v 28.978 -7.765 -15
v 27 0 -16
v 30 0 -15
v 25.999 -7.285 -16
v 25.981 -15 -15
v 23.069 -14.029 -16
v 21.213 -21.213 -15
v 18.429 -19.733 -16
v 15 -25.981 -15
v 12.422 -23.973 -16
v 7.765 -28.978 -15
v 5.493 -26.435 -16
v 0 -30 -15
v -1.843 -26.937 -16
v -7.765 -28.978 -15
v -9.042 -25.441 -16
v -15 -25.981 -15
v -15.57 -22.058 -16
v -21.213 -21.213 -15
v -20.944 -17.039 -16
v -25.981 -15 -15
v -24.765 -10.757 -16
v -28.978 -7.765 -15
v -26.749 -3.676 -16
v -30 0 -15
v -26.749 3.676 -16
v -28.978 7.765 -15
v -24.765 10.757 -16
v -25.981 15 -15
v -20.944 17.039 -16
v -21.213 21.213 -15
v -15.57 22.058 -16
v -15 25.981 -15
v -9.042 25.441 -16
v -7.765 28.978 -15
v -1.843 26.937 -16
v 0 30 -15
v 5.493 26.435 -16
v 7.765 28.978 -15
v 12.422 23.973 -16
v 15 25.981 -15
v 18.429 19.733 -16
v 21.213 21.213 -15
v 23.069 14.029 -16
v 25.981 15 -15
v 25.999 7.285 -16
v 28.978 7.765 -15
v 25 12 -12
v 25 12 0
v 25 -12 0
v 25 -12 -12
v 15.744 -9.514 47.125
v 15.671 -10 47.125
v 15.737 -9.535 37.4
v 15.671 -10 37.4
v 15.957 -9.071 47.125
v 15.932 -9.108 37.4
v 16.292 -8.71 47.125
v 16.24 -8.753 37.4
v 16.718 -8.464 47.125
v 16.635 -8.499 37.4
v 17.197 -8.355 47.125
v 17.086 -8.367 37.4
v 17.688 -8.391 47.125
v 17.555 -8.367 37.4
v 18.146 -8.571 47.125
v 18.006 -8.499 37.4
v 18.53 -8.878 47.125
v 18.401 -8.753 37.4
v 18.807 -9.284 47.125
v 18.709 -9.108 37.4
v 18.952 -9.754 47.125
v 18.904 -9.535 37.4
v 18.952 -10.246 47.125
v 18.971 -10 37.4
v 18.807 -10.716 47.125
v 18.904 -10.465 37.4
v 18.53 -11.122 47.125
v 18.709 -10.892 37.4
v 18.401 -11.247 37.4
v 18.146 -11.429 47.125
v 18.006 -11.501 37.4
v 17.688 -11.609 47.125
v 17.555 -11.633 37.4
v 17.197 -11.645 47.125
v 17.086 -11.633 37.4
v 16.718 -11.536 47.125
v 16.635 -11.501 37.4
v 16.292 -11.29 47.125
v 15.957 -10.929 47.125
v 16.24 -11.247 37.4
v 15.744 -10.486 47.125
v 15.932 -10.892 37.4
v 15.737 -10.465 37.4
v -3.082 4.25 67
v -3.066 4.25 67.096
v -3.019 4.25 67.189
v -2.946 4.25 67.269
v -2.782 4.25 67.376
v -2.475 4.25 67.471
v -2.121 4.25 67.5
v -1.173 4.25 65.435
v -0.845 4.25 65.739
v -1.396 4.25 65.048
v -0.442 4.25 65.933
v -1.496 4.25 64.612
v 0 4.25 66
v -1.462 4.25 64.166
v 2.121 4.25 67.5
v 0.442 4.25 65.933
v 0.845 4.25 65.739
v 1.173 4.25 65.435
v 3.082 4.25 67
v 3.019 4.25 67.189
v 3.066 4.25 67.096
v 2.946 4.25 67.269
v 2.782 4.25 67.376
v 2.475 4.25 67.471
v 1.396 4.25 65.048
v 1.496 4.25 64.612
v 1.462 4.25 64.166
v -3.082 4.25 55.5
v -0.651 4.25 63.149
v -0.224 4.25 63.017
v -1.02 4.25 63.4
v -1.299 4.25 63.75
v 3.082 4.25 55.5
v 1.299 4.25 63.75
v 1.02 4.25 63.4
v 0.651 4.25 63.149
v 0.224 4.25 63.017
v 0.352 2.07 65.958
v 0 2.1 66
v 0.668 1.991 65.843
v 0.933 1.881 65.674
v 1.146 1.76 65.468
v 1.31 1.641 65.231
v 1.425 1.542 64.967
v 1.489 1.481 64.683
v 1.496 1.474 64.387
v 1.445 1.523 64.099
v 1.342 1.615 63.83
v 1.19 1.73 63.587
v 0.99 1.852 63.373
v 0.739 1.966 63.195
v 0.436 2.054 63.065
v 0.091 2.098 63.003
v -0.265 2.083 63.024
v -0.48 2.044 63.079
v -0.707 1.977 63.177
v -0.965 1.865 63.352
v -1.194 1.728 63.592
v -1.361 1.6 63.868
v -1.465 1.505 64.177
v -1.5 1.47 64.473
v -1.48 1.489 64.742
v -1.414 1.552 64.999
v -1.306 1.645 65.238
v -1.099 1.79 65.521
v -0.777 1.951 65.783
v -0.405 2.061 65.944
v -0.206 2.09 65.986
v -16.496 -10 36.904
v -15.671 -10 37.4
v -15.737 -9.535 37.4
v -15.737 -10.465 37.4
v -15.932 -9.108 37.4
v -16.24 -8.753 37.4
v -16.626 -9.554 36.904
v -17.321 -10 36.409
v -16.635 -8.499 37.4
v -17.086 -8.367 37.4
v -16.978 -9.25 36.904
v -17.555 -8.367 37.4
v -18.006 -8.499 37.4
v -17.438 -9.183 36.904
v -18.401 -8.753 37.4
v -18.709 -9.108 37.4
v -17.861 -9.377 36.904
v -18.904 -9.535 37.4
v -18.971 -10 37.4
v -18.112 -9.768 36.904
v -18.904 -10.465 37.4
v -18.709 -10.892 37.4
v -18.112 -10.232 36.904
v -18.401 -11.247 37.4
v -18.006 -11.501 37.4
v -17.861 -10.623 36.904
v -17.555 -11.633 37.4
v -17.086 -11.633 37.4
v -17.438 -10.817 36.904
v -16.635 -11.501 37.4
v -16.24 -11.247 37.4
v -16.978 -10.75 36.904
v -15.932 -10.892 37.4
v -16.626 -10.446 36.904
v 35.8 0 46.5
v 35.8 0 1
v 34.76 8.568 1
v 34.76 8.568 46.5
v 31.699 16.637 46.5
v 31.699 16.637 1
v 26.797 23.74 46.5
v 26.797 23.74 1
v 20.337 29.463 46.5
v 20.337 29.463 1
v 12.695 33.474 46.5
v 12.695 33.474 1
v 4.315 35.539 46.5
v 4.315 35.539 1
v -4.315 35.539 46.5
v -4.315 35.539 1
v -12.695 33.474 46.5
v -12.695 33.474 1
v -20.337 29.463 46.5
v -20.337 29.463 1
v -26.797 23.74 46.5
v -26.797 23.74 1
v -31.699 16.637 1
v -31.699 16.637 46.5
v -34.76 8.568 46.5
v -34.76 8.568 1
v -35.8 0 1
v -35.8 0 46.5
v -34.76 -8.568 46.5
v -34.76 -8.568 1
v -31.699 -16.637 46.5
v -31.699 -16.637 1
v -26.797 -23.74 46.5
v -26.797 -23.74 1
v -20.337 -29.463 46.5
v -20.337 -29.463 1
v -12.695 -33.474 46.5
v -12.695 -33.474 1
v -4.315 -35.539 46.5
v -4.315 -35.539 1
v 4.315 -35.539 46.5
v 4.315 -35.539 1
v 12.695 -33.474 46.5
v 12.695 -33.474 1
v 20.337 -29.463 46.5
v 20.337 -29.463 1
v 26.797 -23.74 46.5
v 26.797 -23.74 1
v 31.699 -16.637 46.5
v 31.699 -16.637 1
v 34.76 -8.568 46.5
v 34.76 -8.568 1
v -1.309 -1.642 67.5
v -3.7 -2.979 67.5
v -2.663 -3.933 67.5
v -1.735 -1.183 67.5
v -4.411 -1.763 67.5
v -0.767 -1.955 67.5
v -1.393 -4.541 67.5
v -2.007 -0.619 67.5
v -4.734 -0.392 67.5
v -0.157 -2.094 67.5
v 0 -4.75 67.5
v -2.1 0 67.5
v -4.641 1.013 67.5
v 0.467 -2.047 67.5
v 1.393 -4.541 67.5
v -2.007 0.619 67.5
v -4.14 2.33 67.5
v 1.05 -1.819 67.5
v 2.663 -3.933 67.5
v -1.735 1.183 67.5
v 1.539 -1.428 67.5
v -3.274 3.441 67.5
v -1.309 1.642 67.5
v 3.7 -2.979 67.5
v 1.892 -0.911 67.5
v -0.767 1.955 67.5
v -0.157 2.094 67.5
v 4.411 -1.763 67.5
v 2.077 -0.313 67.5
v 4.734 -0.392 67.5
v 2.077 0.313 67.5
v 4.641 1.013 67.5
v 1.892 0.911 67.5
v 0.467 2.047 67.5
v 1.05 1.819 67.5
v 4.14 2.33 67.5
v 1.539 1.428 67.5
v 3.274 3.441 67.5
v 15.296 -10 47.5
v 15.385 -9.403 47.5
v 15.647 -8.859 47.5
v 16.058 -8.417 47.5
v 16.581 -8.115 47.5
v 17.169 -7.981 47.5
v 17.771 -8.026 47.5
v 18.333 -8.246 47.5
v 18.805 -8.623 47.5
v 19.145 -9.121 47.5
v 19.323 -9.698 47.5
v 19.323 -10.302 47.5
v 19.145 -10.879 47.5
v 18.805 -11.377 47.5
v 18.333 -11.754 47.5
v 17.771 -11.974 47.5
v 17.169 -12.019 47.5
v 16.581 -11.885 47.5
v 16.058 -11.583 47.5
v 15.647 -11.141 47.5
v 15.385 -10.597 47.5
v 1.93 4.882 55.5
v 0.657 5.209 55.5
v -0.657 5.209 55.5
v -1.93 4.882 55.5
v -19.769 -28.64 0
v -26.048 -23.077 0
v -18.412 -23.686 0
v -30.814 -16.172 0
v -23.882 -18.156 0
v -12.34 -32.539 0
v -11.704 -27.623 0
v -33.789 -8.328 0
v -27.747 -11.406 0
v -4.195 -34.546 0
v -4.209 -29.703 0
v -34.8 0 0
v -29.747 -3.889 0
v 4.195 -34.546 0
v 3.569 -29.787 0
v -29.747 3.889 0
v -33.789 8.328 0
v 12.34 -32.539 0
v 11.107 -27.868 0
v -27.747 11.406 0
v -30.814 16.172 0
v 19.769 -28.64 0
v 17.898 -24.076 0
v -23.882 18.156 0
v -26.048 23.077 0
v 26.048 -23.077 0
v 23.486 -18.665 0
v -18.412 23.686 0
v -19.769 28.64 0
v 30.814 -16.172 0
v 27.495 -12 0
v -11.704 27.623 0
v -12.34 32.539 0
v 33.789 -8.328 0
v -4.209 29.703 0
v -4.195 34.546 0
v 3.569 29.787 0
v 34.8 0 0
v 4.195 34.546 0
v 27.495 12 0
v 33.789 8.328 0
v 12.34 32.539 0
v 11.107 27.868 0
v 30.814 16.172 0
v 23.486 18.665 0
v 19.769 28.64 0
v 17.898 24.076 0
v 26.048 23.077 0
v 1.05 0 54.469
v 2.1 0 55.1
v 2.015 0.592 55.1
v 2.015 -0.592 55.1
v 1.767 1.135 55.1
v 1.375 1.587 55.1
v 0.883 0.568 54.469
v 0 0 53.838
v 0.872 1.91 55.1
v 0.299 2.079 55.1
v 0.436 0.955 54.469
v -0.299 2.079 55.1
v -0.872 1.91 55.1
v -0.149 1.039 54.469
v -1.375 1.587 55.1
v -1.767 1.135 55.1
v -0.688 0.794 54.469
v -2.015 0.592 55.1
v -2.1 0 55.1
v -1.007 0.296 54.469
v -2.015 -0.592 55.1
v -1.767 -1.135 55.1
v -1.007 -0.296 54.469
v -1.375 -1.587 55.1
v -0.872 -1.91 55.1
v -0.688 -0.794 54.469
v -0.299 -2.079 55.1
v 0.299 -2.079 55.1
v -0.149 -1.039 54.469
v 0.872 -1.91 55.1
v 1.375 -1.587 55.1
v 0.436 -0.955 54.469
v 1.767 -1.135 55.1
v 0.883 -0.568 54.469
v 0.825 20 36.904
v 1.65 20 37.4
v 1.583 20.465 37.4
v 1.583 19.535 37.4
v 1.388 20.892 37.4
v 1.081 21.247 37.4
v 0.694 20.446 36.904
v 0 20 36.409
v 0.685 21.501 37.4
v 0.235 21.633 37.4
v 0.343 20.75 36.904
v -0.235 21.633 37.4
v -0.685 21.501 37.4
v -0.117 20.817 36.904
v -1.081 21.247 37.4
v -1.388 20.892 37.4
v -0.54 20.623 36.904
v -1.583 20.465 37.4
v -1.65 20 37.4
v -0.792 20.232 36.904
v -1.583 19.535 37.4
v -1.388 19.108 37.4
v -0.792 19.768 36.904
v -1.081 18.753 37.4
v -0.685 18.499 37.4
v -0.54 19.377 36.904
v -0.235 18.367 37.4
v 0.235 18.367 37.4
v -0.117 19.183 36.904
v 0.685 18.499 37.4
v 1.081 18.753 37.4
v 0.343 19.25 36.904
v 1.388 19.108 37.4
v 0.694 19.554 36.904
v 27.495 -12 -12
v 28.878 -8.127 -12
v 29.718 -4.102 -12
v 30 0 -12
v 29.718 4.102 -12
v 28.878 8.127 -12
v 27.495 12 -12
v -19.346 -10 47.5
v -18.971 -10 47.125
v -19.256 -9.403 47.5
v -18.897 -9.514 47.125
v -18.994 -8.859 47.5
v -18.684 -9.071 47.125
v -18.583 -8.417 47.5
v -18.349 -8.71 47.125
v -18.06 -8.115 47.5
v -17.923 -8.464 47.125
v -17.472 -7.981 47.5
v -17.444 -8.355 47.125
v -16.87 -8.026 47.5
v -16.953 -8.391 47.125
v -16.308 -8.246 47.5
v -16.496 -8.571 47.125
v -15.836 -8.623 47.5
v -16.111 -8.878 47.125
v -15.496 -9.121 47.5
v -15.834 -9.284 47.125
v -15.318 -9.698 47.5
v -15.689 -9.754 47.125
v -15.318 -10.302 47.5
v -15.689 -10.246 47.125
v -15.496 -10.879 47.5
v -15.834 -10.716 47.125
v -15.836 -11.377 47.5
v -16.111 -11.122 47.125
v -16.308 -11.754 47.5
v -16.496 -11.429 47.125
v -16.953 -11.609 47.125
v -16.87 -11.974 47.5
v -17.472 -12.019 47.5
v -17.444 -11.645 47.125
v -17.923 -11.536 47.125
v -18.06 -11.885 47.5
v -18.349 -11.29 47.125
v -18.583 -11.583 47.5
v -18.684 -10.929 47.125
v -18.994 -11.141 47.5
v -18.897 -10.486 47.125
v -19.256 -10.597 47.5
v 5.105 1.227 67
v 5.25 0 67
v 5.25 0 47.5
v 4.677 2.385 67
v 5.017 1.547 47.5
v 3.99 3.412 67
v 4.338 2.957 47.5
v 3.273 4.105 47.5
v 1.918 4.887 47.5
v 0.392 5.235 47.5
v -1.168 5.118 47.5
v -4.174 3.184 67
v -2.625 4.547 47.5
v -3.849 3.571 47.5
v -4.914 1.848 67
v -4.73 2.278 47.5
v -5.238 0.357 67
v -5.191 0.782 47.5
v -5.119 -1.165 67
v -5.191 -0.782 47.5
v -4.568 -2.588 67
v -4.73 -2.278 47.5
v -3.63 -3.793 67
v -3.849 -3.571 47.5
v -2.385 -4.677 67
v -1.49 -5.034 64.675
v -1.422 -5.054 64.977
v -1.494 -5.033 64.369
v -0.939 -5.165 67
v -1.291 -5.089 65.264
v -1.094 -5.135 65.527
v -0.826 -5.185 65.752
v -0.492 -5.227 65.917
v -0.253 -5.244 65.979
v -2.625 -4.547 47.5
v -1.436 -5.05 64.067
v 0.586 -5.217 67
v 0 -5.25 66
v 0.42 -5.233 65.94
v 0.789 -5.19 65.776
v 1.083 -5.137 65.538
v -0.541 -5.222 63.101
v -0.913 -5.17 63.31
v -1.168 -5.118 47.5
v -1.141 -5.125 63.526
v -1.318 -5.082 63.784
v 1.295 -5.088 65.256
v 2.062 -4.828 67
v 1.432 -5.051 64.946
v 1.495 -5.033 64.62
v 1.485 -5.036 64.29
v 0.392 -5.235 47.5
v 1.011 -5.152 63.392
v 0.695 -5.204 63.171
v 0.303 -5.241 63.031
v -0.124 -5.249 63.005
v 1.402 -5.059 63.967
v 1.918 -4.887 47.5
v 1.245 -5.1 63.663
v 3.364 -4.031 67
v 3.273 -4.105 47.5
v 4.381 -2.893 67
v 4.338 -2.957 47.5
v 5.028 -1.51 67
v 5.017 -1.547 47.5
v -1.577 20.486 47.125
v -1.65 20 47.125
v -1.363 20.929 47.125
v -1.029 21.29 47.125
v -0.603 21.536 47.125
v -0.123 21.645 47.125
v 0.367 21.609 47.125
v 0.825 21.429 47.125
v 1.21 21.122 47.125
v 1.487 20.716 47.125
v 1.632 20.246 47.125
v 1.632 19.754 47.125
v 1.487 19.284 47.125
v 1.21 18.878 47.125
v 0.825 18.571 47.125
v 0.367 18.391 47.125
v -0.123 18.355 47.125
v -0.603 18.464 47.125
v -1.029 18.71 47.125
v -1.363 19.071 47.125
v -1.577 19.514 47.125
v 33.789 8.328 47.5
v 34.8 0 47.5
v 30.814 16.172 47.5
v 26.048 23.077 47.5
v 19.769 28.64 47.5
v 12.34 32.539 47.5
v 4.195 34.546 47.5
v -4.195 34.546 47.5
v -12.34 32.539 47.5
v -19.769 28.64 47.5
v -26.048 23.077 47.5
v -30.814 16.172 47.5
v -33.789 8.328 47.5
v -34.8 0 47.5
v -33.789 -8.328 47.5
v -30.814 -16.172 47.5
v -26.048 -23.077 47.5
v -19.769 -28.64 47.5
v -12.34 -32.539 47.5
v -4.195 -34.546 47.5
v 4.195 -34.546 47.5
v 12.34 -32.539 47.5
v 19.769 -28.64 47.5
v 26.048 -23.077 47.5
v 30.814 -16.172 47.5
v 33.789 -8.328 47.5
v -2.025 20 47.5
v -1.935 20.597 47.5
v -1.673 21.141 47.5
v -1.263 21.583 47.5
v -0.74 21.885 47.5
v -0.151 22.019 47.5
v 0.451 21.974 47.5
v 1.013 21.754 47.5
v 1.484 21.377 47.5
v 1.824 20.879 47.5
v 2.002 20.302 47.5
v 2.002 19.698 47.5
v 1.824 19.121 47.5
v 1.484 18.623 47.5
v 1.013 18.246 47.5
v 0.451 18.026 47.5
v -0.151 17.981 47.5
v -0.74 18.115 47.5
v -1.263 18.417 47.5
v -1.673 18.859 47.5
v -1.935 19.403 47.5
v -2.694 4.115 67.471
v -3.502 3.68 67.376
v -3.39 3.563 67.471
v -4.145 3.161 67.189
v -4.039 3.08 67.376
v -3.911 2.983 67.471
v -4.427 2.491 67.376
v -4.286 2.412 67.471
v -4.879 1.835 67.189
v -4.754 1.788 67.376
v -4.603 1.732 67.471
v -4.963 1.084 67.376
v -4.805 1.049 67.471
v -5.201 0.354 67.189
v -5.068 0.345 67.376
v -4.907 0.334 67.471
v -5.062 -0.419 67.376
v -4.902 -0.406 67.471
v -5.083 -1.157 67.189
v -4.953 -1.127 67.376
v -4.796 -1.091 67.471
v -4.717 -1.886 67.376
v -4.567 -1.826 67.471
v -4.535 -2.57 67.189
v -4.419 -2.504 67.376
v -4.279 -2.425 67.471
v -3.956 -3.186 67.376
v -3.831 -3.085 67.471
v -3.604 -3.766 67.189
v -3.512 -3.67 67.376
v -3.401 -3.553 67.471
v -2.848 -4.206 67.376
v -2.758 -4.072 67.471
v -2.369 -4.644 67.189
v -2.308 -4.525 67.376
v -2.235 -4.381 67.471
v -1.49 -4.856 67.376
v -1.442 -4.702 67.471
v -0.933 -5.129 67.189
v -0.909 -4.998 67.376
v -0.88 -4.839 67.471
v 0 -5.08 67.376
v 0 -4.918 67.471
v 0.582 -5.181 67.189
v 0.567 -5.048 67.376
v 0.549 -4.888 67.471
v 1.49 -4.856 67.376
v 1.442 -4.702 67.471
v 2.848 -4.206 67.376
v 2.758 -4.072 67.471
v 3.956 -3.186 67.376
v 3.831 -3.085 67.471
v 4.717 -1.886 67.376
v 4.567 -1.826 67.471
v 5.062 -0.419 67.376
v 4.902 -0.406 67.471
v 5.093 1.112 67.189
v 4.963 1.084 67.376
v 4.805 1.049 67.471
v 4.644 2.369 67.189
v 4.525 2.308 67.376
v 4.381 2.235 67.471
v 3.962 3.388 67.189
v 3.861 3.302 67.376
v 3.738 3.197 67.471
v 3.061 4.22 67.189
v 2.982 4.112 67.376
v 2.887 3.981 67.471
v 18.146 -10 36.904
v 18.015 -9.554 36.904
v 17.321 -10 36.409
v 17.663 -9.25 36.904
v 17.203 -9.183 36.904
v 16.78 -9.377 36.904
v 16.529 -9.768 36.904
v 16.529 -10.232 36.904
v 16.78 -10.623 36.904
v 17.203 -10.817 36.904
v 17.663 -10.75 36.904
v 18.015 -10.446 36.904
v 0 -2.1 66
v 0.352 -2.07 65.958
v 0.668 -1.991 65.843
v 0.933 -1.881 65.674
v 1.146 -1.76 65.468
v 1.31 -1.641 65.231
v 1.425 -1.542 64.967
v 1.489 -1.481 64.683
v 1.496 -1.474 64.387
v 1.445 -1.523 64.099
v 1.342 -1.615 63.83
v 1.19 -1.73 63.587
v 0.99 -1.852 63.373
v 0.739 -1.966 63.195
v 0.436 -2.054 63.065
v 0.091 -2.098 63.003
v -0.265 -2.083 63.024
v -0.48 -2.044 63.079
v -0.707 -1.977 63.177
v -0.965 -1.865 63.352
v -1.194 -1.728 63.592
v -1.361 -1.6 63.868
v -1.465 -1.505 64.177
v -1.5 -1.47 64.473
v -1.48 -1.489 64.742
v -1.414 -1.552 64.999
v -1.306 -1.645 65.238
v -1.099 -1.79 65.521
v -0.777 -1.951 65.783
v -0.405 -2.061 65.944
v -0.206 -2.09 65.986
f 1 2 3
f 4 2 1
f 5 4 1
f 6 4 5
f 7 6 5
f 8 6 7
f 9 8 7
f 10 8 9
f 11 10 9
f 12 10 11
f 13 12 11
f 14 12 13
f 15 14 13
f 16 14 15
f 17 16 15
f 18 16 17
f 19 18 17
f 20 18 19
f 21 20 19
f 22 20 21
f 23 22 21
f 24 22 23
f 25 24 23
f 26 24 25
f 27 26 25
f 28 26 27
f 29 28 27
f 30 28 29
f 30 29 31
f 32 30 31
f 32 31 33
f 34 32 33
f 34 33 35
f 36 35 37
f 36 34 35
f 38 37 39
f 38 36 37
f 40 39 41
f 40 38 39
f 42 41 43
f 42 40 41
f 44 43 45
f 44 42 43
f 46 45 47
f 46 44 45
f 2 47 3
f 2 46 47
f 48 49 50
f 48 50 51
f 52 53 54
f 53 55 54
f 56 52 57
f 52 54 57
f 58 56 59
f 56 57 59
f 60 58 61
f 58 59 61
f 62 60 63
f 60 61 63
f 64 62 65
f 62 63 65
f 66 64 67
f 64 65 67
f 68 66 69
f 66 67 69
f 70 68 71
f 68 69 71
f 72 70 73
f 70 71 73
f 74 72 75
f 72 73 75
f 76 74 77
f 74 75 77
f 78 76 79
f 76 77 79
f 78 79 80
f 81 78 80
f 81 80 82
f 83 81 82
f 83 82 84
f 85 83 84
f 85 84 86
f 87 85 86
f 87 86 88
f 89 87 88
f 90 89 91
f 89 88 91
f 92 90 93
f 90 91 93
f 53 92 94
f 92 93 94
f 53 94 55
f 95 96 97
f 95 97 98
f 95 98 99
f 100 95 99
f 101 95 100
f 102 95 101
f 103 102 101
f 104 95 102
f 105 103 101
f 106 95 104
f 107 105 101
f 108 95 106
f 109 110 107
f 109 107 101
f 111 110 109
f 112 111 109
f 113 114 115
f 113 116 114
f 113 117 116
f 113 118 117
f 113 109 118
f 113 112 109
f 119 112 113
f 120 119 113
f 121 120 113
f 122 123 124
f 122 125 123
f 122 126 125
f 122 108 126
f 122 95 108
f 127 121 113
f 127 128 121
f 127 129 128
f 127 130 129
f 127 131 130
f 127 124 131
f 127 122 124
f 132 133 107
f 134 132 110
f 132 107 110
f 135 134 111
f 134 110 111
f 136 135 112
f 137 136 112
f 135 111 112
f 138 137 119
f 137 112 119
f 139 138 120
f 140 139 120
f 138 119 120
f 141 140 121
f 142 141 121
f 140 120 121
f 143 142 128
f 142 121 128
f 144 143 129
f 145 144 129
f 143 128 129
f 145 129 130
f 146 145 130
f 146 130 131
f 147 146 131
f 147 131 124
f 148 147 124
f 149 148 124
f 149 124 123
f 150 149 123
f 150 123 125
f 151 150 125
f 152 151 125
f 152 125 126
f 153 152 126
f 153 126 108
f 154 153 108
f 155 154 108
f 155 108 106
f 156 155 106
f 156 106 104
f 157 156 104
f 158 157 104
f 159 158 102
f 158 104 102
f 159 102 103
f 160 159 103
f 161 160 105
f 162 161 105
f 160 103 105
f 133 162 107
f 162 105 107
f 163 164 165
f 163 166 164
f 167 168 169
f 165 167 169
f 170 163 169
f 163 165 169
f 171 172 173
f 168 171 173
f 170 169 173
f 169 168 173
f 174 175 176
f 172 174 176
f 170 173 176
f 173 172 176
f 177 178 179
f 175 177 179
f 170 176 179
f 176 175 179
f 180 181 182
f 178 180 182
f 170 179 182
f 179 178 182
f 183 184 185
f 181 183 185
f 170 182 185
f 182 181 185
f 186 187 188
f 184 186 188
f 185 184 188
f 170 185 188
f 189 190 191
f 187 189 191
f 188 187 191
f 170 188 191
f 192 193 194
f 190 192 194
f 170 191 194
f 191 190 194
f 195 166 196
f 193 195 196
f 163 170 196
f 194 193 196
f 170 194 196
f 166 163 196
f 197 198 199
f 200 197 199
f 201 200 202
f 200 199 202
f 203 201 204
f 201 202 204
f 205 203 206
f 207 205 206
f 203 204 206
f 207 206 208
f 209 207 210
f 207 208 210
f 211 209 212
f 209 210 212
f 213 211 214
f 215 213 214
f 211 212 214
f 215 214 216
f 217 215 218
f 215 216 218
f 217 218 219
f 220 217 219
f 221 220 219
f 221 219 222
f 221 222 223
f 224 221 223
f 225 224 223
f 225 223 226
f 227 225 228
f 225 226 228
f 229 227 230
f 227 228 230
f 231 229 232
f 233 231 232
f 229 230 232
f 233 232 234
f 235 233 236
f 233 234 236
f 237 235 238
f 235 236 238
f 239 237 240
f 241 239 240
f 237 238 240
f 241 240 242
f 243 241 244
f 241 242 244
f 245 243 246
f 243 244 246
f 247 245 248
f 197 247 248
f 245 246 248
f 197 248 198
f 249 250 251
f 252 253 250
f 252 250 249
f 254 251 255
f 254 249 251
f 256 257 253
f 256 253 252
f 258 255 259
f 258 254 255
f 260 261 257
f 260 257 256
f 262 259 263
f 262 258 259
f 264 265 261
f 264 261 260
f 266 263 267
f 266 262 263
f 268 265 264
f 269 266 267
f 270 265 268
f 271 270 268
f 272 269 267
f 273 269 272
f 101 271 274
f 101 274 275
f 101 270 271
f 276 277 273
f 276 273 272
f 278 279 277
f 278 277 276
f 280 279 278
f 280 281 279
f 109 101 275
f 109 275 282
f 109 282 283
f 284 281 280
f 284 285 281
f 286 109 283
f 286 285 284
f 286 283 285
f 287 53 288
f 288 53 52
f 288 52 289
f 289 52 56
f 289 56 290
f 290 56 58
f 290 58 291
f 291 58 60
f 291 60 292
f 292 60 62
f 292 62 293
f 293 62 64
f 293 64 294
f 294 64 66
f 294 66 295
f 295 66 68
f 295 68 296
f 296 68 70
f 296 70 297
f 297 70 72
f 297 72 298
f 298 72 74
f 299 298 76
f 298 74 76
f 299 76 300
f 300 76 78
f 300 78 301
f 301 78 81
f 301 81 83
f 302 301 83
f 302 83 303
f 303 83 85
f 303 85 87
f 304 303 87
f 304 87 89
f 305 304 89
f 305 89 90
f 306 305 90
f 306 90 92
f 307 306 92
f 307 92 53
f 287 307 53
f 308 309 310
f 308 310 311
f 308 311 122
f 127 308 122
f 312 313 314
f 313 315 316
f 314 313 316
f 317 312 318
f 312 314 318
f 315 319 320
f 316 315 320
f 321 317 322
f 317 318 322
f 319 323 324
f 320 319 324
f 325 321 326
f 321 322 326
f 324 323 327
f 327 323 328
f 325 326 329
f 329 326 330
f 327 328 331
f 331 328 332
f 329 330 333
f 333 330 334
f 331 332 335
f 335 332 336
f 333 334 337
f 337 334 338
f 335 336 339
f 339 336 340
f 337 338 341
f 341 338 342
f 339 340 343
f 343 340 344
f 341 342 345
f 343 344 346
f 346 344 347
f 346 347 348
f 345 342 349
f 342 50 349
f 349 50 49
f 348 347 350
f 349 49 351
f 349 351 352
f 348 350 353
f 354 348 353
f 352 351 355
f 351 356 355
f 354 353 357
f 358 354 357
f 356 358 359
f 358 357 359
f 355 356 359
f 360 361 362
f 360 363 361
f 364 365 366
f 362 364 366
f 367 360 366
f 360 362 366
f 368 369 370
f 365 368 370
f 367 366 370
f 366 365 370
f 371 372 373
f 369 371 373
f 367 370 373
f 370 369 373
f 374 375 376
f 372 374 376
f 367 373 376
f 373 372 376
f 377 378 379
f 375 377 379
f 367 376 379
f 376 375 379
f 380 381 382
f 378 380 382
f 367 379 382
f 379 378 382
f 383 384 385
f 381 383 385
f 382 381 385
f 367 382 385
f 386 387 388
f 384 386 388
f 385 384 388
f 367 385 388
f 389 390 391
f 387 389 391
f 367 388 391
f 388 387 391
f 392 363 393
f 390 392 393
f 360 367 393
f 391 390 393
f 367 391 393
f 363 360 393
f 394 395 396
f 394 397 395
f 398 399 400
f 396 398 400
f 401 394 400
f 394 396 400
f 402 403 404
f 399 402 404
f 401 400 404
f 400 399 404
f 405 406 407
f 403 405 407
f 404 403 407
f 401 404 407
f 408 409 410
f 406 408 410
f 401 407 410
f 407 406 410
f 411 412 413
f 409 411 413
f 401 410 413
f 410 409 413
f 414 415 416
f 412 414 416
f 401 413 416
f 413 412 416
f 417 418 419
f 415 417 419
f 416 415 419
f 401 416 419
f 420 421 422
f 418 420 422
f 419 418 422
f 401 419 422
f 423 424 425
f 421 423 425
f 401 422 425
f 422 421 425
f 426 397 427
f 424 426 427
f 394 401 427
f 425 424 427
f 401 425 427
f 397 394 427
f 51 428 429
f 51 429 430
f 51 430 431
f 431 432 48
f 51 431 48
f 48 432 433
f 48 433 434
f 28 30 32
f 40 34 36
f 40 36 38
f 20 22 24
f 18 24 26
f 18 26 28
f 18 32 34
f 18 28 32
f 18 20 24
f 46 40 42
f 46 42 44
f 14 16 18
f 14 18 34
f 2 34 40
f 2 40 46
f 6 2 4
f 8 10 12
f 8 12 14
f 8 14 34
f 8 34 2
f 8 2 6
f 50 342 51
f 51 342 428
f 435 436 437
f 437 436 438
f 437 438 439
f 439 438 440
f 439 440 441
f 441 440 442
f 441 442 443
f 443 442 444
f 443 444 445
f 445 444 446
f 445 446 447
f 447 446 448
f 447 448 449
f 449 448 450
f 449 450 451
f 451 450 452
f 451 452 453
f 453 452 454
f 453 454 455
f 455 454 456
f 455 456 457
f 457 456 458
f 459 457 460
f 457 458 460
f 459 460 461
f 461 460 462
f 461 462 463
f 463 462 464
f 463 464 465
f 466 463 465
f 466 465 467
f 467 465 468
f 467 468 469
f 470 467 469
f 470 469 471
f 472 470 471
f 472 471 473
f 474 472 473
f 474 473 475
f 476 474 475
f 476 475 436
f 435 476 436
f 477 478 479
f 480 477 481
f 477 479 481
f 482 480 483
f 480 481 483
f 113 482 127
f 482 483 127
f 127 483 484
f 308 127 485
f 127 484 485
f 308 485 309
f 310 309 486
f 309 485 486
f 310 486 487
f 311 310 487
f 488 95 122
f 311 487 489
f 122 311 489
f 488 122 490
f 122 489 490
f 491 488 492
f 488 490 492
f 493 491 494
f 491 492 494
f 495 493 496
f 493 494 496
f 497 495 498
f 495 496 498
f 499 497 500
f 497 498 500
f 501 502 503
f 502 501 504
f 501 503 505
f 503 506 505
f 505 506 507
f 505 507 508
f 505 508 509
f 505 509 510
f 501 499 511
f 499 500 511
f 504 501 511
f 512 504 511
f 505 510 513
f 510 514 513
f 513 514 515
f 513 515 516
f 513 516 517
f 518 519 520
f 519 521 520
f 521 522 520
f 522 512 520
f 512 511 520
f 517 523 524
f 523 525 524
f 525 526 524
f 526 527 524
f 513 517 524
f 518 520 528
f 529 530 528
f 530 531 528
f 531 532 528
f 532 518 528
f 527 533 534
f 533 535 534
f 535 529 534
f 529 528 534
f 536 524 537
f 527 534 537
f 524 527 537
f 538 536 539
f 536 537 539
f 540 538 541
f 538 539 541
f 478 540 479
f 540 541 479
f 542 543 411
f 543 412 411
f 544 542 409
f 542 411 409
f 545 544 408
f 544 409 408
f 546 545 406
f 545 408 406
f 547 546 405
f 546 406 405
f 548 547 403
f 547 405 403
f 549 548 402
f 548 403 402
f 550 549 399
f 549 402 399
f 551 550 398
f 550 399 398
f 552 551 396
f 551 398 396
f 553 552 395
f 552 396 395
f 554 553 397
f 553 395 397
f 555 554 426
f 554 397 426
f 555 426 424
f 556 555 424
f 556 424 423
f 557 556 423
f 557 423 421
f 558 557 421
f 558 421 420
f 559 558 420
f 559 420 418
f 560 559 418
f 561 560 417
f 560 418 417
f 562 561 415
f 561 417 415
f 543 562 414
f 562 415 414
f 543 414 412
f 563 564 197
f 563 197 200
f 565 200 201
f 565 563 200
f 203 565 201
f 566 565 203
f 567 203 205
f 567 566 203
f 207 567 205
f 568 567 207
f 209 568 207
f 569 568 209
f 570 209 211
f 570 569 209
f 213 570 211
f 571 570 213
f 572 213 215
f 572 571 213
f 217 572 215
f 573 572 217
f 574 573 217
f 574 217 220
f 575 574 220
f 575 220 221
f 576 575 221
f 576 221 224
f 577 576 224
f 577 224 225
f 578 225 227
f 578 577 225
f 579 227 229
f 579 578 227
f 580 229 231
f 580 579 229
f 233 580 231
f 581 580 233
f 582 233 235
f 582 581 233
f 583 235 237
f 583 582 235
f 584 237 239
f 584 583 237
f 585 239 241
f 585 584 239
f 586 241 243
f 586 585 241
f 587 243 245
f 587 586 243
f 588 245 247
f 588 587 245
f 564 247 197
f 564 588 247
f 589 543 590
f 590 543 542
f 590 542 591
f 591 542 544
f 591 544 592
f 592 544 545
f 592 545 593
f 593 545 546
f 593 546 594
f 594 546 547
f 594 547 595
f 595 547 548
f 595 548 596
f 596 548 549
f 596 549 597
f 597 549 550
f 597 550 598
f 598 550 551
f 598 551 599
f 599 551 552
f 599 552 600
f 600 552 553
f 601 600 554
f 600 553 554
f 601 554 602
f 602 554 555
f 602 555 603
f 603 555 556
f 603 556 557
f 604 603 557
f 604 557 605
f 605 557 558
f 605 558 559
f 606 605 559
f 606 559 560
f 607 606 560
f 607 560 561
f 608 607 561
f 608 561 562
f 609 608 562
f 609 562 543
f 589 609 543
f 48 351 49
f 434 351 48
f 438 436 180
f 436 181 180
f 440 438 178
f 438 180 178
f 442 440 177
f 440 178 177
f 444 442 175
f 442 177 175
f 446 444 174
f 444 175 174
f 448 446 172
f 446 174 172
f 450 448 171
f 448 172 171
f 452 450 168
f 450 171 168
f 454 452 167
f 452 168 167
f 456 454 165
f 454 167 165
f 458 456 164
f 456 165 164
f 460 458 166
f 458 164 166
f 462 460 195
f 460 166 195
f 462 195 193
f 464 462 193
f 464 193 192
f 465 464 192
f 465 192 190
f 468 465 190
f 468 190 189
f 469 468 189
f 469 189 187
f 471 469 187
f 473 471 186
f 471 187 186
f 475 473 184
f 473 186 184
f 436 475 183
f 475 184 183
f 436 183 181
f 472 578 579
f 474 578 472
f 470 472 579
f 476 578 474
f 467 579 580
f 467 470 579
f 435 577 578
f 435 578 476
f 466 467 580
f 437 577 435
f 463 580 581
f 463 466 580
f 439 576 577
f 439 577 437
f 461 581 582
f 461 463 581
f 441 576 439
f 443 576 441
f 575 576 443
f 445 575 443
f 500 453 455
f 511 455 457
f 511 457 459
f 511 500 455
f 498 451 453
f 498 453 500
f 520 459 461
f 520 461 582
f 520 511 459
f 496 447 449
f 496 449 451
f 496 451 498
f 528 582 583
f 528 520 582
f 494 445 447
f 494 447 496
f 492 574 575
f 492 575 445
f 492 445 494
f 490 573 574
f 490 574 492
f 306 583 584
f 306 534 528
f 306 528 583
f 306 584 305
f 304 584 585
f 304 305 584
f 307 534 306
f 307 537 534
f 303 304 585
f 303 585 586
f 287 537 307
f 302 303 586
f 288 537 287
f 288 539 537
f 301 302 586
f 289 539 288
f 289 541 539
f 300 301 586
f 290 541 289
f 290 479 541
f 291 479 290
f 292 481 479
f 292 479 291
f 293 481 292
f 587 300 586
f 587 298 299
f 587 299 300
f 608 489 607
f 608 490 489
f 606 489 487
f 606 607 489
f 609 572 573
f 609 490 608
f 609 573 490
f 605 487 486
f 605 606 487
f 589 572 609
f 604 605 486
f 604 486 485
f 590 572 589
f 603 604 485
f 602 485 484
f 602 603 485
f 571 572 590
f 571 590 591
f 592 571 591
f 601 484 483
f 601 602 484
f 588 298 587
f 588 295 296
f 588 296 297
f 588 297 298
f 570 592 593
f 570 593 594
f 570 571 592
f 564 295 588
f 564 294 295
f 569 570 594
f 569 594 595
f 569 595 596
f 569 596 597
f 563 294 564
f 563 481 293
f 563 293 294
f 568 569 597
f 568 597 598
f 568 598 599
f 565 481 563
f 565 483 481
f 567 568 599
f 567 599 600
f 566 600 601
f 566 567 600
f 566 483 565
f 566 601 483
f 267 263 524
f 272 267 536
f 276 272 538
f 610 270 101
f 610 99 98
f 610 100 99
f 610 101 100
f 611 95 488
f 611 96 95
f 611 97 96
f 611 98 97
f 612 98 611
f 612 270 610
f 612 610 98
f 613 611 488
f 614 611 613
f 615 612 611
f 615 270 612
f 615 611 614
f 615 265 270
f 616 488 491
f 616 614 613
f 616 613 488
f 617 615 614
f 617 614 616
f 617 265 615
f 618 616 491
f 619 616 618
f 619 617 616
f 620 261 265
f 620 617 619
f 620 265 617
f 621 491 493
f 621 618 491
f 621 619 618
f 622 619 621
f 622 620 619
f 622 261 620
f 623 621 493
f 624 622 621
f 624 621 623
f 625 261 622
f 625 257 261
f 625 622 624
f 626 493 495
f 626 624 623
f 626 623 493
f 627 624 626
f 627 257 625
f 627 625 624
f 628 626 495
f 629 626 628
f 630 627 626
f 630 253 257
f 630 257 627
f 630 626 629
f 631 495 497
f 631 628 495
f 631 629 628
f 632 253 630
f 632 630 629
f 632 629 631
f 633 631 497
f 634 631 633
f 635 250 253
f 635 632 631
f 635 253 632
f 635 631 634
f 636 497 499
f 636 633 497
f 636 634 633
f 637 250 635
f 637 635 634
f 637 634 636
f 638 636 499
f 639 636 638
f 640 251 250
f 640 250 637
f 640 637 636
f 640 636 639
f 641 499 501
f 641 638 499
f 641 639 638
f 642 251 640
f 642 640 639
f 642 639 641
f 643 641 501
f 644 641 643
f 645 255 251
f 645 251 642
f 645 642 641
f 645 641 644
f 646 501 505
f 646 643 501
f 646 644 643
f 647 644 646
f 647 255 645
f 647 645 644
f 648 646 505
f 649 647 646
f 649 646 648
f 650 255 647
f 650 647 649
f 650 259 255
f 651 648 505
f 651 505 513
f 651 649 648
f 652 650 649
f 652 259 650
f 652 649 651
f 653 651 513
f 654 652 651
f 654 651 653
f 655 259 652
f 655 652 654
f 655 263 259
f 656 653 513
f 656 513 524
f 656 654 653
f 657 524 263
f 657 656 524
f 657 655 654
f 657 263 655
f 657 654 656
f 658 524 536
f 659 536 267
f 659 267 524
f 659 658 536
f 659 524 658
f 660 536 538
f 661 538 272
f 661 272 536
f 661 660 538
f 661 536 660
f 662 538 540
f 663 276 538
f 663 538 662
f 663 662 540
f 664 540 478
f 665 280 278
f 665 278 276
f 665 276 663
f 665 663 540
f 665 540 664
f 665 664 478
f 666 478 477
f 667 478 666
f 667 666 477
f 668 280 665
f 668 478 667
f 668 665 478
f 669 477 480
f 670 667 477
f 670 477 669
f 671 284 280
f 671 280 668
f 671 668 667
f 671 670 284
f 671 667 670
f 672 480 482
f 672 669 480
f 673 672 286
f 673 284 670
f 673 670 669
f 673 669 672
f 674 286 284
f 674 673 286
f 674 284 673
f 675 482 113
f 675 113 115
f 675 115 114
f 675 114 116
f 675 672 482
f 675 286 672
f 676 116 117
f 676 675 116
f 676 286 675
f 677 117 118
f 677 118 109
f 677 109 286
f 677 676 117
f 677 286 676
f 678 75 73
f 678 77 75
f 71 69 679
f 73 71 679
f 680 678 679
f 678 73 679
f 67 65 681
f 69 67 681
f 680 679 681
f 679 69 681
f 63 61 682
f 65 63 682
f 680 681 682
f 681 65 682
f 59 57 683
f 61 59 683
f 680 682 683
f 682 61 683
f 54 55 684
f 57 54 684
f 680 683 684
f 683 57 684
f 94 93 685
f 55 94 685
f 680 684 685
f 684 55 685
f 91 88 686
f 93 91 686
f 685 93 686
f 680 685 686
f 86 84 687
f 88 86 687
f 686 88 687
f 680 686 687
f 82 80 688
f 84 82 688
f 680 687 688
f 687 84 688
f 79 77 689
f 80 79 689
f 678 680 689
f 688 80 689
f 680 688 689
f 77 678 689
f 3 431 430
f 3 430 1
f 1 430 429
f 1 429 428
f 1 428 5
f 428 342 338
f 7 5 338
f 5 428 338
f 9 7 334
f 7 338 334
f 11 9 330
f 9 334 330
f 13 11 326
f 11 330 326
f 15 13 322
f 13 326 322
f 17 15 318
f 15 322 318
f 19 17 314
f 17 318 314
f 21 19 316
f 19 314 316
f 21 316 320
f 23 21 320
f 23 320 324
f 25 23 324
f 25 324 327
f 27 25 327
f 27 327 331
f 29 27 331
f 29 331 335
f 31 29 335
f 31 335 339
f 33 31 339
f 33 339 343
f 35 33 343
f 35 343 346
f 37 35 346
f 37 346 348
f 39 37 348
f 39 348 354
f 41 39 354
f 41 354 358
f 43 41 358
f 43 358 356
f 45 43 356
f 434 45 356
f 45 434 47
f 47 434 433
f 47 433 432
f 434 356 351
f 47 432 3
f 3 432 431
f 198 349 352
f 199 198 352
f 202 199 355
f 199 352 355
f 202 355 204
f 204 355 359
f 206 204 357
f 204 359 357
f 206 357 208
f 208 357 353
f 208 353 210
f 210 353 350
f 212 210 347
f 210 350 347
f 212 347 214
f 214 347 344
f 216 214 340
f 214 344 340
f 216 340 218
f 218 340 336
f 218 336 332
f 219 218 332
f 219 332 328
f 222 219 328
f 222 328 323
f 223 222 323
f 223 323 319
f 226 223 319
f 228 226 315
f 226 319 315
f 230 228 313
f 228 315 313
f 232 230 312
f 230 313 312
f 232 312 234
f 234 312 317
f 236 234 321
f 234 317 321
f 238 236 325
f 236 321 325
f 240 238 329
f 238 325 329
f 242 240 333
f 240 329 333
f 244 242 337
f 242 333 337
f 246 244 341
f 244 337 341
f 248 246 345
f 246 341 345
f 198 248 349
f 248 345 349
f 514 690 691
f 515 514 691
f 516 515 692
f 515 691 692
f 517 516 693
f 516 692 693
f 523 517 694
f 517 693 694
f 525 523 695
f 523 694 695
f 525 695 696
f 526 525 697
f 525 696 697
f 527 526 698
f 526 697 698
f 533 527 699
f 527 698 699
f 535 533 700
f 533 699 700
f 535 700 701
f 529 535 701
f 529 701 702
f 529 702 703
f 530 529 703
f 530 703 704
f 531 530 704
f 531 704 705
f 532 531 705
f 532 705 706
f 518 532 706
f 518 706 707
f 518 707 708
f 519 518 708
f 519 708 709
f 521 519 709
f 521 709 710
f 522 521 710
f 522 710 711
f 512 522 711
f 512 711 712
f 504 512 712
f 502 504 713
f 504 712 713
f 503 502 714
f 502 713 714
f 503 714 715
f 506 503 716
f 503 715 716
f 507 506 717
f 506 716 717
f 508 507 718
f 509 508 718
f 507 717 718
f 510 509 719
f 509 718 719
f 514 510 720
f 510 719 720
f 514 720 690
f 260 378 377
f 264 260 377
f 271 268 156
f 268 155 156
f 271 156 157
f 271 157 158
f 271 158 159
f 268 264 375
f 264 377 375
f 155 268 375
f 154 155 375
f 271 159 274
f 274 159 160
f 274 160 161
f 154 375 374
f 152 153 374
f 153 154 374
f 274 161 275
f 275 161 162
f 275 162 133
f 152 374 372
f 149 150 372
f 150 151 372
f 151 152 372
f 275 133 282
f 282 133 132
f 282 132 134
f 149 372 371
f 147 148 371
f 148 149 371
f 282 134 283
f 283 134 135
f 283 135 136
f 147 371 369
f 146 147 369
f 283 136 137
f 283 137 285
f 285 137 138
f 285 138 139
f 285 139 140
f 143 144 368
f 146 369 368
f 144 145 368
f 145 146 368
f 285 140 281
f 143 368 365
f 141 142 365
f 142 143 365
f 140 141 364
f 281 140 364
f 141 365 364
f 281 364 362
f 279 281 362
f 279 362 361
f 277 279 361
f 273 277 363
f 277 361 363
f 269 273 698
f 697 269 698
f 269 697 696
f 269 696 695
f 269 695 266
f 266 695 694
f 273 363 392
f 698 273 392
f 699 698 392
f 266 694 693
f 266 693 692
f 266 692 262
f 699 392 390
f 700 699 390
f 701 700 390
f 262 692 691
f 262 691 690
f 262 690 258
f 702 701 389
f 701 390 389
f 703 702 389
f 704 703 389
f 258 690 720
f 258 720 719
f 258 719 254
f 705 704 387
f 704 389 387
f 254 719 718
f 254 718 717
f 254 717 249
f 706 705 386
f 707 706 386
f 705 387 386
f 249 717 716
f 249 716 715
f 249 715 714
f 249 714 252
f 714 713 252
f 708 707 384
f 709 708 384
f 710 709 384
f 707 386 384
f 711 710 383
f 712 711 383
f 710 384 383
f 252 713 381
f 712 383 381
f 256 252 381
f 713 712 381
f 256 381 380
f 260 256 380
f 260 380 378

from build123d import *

# Parameters (mm, degrees)
SKETCH_1_R                   = 35.8
EXTRUDE_1_DEPTH              = 47.5
HOLE_WIZARD_M4_1_D           = 3.3
HOLE_WIZARD_M4_1_DEPTH       = 10.1
HOLE_WIZARD_M4_1_CSINK_D     = 4.05
HOLE_WIZARD_M4_1_CSINK_ANGLE = 90
HOLE_WIZARD_M4_1_TIP         = 0.991420021
CHAMFER_1_SIZE               = 1
SKETCH_8_R                   = 30
EXTRUDE_2_DEPTH              = 16
SKETCH_9_R                   = 5.25
EXTRUDE_3_DEPTH              = 20
FILLET_1_R                   = 0.5
HOLE_WIZARD_M5_1_D           = 4.2
HOLE_WIZARD_M5_1_DEPTH       = 12.4
HOLE_WIZARD_M5_1_TIP         = 1.2618073
CUT_EXTRUDE_START            = -12
CUT_EXTRUDE_1_DEPTH          = 12
SKETCH_14_R                  = 1.5
CUT_EXTRUDE_2_DEPTH          = 87.266404315
SKETCH_15_W                  = 12
SKETCH_15_H                  = 24
CUT_EXTRUDE_3_DEPTH          = 5
CHAMFER_2_SIZE               = 1
CHAMFER_2_SIZE2              = 3


with BuildPart() as part:
    # 草图1 → 凸台-拉伸1 (new body)
    with BuildSketch(Plane.XY):
        Circle(SKETCH_1_R)
    extrude(amount=EXTRUDE_1_DEPTH)

    # M4 螺纹孔1
    with Locations(Plane.XY.offset(47.5)):
        with Locations((0, 20), (17.320508076, -10), (-17.320508076, -10)):
            CounterSinkHole(HOLE_WIZARD_M4_1_D / 2, HOLE_WIZARD_M4_1_CSINK_D / 2, depth=HOLE_WIZARD_M4_1_DEPTH, counter_sink_angle=HOLE_WIZARD_M4_1_CSINK_ANGLE)
            with Locations((0, 0, -(HOLE_WIZARD_M4_1_DEPTH + HOLE_WIZARD_M4_1_TIP / 2))):  # 118° drill point
                Cone(0, HOLE_WIZARD_M4_1_D / 2, HOLE_WIZARD_M4_1_TIP, mode=Mode.SUBTRACT)

    # 倒角1
    chamfer_1_edges = [part.edges().sort_by_distance(p)[0] for p in [
        (-35.8, 0, 0),
        (-35.8, 0, 47.5),
    ]]
    chamfer(chamfer_1_edges, length=CHAMFER_1_SIZE)

    # 草图8 → 凸台-拉伸2 (add)
    with BuildSketch(Plane(origin=(0, 0, 0), x_dir=(-1, 0, 0), z_dir=(0, 0, -1))):
        with Locations(Location((0, 0, 0), (0, 0, 180))):
            Circle(SKETCH_8_R)
    extrude(amount=EXTRUDE_2_DEPTH)

    # 草图9 → 凸台-拉伸3 (add)
    with BuildSketch(Plane.XY.offset(47.5)):
        Circle(SKETCH_9_R)
    extrude(amount=EXTRUDE_3_DEPTH)

    # 圆角1
    fillet_1_edges = [part.edges().sort_by_distance(p)[0] for p in [
        (-5.25, 0, 67.5),
    ]]
    fillet(fillet_1_edges, radius=FILLET_1_R)

    # M5 螺纹孔1
    with Locations(Plane.XY.offset(67.5)):
        with Locations((0, 0)):
            Hole(HOLE_WIZARD_M5_1_D / 2, depth=HOLE_WIZARD_M5_1_DEPTH)
            with Locations((0, 0, -(HOLE_WIZARD_M5_1_DEPTH + HOLE_WIZARD_M5_1_TIP / 2))):  # 118° drill point
                Cone(0, HOLE_WIZARD_M5_1_D / 2, HOLE_WIZARD_M5_1_TIP, mode=Mode.SUBTRACT)

    # 草图13 → 切除-拉伸1 (cut)
    with BuildSketch(Plane.XY.offset(67.5).offset(CUT_EXTRUDE_START)):
        with BuildLine():
            Line((-3.082207001, 4.25), (3.082207001, 4.25))
            ThreePointArc((3.082207001, 4.25), (0, 5.25), (-3.082207001, 4.25))
        make_face()
    extrude(amount=CUT_EXTRUDE_1_DEPTH, mode=Mode.SUBTRACT)

    # 草图14 → 切除-拉伸2 (cut, through all)
    with BuildSketch(Plane(origin=(0, 4.25, 0), x_dir=(1, 0, 0), z_dir=(0, 1, 0))):
        with Locations(Location((0, -64.5, 0), (0, 0, 270))):
            Circle(SKETCH_14_R)
    extrude(amount=-CUT_EXTRUDE_2_DEPTH, mode=Mode.SUBTRACT)

    # 草图15 → 切除-拉伸3 (cut)
    with BuildSketch(Plane(origin=(30, 0, 0), x_dir=(0, 0, -1), z_dir=(1, 0, 0))):
        with Locations((6, 0)):
            Rectangle(SKETCH_15_W, SKETCH_15_H)
    extrude(amount=-CUT_EXTRUDE_3_DEPTH, mode=Mode.SUBTRACT)

    # 倒角2
    chamfer_2_edges = [part.edges().sort_by_distance(p)[0] for p in [
        (-30, 0, -16),
    ]]
    chamfer_2_side = [part.faces().sort_by_distance(p)[0] for p in [
        (-30, 0, -8),
    ]]
    chamfer(chamfer_2_edges, length=CHAMFER_2_SIZE, length2=CHAMFER_2_SIZE2, reference=chamfer_2_side[0])


solid = part.part
